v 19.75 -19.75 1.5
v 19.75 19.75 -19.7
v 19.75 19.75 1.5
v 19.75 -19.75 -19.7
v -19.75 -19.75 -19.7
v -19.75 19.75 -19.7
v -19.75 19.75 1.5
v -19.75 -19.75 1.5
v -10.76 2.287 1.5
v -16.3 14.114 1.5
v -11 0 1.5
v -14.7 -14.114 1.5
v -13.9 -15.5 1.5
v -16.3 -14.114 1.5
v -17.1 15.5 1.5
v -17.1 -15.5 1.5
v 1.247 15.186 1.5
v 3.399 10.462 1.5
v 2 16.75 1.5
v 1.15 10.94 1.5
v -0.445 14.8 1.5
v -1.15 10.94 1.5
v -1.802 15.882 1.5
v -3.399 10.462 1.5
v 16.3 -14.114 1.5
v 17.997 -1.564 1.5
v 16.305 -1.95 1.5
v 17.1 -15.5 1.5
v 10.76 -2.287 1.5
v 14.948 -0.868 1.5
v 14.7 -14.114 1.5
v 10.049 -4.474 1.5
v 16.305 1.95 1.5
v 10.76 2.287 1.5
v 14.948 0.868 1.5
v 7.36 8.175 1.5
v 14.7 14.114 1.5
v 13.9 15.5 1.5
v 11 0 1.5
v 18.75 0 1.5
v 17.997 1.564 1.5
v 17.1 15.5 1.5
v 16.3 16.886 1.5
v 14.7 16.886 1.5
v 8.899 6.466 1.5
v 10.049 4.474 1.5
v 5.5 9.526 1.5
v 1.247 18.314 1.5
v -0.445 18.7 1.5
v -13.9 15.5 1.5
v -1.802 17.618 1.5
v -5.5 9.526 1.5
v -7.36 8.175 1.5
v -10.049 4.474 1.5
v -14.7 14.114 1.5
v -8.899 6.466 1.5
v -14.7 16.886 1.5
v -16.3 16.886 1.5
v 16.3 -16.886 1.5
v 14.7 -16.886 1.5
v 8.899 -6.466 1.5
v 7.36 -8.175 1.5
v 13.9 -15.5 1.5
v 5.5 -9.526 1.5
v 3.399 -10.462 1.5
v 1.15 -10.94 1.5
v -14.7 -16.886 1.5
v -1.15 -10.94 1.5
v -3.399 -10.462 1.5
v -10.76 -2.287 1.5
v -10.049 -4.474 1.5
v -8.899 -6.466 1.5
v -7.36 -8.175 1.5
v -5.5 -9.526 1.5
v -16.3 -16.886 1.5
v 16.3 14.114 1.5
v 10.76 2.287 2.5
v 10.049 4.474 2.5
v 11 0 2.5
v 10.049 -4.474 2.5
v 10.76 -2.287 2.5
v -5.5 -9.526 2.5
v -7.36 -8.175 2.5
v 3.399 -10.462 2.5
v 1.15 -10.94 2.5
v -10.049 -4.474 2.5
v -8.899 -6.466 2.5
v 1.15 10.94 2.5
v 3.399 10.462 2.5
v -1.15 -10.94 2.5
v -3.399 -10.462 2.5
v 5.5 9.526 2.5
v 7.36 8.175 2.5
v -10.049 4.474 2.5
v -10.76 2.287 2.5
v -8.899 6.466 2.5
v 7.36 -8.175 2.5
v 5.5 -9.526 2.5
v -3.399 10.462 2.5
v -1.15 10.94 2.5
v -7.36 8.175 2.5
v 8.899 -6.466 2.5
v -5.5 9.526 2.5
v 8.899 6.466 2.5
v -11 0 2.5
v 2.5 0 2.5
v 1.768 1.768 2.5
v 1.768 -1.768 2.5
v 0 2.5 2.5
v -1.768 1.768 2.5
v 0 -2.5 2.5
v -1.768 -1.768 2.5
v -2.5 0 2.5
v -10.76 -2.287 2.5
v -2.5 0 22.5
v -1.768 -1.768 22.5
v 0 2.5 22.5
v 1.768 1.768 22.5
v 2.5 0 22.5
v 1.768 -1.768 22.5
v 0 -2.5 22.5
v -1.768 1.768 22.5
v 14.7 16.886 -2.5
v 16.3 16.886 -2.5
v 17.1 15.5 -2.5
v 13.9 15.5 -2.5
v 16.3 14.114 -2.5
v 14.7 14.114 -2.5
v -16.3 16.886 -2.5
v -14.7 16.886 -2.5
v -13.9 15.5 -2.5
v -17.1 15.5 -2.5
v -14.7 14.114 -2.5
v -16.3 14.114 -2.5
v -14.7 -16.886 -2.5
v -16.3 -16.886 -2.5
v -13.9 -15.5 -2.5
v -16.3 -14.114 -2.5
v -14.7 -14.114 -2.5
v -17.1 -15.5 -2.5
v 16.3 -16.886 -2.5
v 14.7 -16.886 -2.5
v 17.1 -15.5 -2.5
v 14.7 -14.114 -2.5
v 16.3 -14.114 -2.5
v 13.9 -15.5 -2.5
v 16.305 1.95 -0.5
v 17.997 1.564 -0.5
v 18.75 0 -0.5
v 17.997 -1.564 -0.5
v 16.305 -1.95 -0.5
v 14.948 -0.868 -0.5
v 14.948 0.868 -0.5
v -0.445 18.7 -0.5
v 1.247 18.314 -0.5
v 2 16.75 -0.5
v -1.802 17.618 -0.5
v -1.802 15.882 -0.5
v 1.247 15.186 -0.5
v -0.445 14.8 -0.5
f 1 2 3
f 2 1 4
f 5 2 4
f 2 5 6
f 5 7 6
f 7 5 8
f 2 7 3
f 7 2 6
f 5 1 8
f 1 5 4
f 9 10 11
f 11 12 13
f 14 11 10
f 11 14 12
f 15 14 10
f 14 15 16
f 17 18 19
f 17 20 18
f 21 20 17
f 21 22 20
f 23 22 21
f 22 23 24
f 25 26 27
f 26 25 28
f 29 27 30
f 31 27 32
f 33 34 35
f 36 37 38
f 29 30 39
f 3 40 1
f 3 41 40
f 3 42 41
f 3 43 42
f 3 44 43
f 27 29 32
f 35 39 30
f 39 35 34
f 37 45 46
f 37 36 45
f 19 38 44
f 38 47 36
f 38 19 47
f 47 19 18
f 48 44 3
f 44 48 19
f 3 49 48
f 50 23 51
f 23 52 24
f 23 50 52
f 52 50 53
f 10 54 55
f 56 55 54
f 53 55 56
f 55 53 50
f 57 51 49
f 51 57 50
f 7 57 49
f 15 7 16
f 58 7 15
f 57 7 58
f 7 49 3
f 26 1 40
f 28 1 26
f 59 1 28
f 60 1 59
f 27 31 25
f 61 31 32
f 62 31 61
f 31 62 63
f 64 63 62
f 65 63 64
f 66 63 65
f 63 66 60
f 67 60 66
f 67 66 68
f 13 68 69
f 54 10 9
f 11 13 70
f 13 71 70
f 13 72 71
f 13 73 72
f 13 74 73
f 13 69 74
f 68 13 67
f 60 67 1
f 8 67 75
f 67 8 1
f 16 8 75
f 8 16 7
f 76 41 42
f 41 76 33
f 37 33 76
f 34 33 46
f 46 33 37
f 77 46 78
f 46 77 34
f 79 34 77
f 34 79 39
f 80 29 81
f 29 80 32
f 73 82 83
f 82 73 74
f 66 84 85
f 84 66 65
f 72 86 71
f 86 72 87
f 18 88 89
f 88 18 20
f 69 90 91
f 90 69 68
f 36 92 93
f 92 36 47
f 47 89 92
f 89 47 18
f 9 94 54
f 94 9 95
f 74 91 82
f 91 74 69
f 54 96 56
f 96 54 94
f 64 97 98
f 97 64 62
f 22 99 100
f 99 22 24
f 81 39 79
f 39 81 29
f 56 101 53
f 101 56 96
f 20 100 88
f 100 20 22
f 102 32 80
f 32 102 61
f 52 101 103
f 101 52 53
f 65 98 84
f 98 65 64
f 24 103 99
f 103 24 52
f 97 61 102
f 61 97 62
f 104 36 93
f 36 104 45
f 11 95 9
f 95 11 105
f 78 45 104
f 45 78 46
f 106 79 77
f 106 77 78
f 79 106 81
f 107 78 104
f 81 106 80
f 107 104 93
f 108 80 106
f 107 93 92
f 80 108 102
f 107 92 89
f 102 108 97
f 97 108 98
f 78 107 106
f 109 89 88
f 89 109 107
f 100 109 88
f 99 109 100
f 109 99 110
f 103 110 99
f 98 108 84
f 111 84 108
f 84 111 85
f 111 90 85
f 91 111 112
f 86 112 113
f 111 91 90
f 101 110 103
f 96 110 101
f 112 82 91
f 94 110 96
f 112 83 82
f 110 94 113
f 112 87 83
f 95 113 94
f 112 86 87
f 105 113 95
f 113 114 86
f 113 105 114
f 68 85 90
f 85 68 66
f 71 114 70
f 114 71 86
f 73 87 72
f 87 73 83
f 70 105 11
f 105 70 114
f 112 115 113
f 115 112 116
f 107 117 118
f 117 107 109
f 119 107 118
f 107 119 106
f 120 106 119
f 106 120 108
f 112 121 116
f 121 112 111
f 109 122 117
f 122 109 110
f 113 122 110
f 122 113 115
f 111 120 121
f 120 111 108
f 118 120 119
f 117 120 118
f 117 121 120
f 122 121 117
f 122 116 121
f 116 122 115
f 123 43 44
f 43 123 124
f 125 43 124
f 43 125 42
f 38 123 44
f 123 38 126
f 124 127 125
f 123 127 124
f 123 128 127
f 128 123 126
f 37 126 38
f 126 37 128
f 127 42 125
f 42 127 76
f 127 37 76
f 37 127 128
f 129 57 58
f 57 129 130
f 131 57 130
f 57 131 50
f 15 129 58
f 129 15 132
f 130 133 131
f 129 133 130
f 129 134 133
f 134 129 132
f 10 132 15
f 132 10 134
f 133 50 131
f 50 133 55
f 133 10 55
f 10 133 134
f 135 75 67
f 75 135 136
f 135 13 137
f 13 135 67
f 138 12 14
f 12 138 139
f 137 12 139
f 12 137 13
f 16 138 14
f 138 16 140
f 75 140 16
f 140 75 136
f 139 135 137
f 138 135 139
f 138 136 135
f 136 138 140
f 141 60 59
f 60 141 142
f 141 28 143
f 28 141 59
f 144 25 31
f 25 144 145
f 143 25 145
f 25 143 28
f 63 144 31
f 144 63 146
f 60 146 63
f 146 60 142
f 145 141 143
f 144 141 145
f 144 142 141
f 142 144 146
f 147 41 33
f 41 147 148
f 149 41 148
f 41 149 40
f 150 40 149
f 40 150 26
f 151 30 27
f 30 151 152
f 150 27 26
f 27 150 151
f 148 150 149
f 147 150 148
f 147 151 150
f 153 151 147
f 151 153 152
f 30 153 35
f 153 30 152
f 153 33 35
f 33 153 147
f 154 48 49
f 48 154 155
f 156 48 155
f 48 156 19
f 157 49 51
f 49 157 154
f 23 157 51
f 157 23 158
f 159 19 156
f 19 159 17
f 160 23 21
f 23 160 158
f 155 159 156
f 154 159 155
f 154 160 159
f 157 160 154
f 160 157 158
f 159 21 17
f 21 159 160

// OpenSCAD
// Parameters
face_width = 39.5; //[20:80:0.1]
face_thickness = 3; //[1.5:8:0.1]
body_length = 19.2; //[10:60:0.1]
body_width = 39.5; //[20:80:0.1]
body_height = 39.5; //[20:80:0.1]
corner_radius = 2; //[0:6:0.1]
shaft_diameter = 5; //[2:12:0.1]
shaft_length = 20; //[5:60:0.1]
front_boss_diameter = 22; //[10:40:0.1]
front_boss_thickness = 2; //[0.5:8:0.1]
mounting_hole_spacing = 31; //[15:60:0.1]
mounting_hole_diameter = 3.2; //[2:6:0.1]
hole_through_extra = 2; //[0.5:6:0.1]
overlap = 1; //[0.5:2:0.1]
d_plug_length = 14; //[7:28:0.1]
d_plug_width = 10; //[5:20:0.1]
d_plug_rad = 2; //[0.5:5:0.1]
grill_width = 18; //[8:35:0.1]
grill_height = 18; //[8:35:0.1]
grill_hole_diameter = 2; //[1:5:0.1]
grill_hole_depth = 1.5; //[0.5:5:0.1]
screw_shank_diameter = 3; //[2:6:0.1]
screw_length = 10; //[4:30:0.1]
washer_outer_diameter = 7; //[4:14:0.1]
washer_thickness = 1; //[0.5:3:0.1]
ttrack_hole_diameter = 4; //[2:8:0.1]
ttrack_hole_depth = 2; //[0.5:6:0.1]
rail_hole_diameter = 4; //[2:8:0.1]
rail_hole_depth = 2; //[0.5:6:0.1]

// Modules
module d_plug_D() {
  color("Gray") {
    translate([0, 0, -face_thickness/2])
      linear_extrude(height=face_thickness)
        offset(r=d_plug_rad)
          square([d_plug_length, d_plug_width], center=true);
  }
}

module grill_hole_positions() {
  color("DarkGray") {
    translate([0, 0, face_thickness/2 - grill_hole_depth/2])
      cylinder(r=grill_hole_diameter/2, h=grill_hole_depth, center=true);
  }
}

module screw_and_washer() {
  color("Silver") {
    translate([mounting_hole_spacing/2, mounting_hole_spacing/2, face_thickness/2 - overlap - screw_length/2])
      cylinder(r=screw_shank_diameter/2, h=screw_length, center=true);
    translate([mounting_hole_spacing/2, mounting_hole_spacing/2, face_thickness/2 - overlap - washer_thickness/2])
      cylinder(r=washer_outer_diameter/2, h=washer_thickness, center=true);
  }
}

module ttrack_hole_positions() {
  color("DarkGray") {
    translate([face_width/2 - ttrack_hole_diameter/2 - overlap, 0, face_thickness/2 - ttrack_hole_depth/2])
      cylinder(r=ttrack_hole_diameter/2, h=ttrack_hole_depth, center=true);
  }
}

module rail_hole_positions() {
  color("DarkGray") {
    translate([0, face_width/2 - rail_hole_diameter/2 - overlap, face_thickness/2 - rail_hole_depth/2])
      cylinder(r=rail_hole_diameter/2, h=rail_hole_depth, center=true);
  }
}

module motor_body() {
  color("Black") {
    translate([0, 0, -(face_thickness/2 + body_length/2 - overlap)])
      cube([body_width, body_height, body_length], center=true);
  }
}

module front_face() {
  color("Black") {
    translate([0, 0, 0])
      cube([face_width, face_width, face_thickness], center=true);
  }
}

module front_boss() {
  color("Silver") {
    translate([0, 0, face_thickness/2 + front_boss_thickness/2 - overlap])
      cylinder(r=front_boss_diameter/2, h=front_boss_thickness, center=true);
  }
}

module output_shaft() {
  color("Silver") {
    translate([0, 0, face_thickness/2 + front_boss_thickness - overlap + shaft_length/2])
      cylinder(r=shaft_diameter/2, h=shaft_length, center=true);
  }
}

module mounting_holes_pattern() {
  union() {
    translate([mounting_hole_spacing/2, mounting_hole_spacing/2, 0])
      cylinder(r=mounting_hole_diameter/2, h=face_thickness + hole_through_extra, center=true);
    translate([-mounting_hole_spacing/2, mounting_hole_spacing/2, 0])
      cylinder(r=mounting_hole_diameter/2, h=face_thickness + hole_through_extra, center=true);
    translate([-mounting_hole_spacing/2, -mounting_hole_spacing/2, 0])
      cylinder(r=mounting_hole_diameter/2, h=face_thickness + hole_through_extra, center=true);
    translate([mounting_hole_spacing/2, -mounting_hole_spacing/2, 0])
      cylinder(r=mounting_hole_diameter/2, h=face_thickness + hole_through_extra, center=true);
  }
}

module motor_with_mounting_holes() {
  difference() {
    union() {
      motor_body();
      front_face();
      front_boss();
      output_shaft();
      screw_and_washer();
    }
    mounting_holes_pattern();
  }
}

module motor_with_all_reference_holes() {
  difference() {
    motor_with_mounting_holes();
    grill_hole_positions();
    ttrack_hole_positions();
    rail_hole_positions();
  }
}

module final_model() {
  union() {
    motor_with_all_reference_holes();
    d_plug_D();
  }
}

module assembly() {
  final_model();
}

assembly();
